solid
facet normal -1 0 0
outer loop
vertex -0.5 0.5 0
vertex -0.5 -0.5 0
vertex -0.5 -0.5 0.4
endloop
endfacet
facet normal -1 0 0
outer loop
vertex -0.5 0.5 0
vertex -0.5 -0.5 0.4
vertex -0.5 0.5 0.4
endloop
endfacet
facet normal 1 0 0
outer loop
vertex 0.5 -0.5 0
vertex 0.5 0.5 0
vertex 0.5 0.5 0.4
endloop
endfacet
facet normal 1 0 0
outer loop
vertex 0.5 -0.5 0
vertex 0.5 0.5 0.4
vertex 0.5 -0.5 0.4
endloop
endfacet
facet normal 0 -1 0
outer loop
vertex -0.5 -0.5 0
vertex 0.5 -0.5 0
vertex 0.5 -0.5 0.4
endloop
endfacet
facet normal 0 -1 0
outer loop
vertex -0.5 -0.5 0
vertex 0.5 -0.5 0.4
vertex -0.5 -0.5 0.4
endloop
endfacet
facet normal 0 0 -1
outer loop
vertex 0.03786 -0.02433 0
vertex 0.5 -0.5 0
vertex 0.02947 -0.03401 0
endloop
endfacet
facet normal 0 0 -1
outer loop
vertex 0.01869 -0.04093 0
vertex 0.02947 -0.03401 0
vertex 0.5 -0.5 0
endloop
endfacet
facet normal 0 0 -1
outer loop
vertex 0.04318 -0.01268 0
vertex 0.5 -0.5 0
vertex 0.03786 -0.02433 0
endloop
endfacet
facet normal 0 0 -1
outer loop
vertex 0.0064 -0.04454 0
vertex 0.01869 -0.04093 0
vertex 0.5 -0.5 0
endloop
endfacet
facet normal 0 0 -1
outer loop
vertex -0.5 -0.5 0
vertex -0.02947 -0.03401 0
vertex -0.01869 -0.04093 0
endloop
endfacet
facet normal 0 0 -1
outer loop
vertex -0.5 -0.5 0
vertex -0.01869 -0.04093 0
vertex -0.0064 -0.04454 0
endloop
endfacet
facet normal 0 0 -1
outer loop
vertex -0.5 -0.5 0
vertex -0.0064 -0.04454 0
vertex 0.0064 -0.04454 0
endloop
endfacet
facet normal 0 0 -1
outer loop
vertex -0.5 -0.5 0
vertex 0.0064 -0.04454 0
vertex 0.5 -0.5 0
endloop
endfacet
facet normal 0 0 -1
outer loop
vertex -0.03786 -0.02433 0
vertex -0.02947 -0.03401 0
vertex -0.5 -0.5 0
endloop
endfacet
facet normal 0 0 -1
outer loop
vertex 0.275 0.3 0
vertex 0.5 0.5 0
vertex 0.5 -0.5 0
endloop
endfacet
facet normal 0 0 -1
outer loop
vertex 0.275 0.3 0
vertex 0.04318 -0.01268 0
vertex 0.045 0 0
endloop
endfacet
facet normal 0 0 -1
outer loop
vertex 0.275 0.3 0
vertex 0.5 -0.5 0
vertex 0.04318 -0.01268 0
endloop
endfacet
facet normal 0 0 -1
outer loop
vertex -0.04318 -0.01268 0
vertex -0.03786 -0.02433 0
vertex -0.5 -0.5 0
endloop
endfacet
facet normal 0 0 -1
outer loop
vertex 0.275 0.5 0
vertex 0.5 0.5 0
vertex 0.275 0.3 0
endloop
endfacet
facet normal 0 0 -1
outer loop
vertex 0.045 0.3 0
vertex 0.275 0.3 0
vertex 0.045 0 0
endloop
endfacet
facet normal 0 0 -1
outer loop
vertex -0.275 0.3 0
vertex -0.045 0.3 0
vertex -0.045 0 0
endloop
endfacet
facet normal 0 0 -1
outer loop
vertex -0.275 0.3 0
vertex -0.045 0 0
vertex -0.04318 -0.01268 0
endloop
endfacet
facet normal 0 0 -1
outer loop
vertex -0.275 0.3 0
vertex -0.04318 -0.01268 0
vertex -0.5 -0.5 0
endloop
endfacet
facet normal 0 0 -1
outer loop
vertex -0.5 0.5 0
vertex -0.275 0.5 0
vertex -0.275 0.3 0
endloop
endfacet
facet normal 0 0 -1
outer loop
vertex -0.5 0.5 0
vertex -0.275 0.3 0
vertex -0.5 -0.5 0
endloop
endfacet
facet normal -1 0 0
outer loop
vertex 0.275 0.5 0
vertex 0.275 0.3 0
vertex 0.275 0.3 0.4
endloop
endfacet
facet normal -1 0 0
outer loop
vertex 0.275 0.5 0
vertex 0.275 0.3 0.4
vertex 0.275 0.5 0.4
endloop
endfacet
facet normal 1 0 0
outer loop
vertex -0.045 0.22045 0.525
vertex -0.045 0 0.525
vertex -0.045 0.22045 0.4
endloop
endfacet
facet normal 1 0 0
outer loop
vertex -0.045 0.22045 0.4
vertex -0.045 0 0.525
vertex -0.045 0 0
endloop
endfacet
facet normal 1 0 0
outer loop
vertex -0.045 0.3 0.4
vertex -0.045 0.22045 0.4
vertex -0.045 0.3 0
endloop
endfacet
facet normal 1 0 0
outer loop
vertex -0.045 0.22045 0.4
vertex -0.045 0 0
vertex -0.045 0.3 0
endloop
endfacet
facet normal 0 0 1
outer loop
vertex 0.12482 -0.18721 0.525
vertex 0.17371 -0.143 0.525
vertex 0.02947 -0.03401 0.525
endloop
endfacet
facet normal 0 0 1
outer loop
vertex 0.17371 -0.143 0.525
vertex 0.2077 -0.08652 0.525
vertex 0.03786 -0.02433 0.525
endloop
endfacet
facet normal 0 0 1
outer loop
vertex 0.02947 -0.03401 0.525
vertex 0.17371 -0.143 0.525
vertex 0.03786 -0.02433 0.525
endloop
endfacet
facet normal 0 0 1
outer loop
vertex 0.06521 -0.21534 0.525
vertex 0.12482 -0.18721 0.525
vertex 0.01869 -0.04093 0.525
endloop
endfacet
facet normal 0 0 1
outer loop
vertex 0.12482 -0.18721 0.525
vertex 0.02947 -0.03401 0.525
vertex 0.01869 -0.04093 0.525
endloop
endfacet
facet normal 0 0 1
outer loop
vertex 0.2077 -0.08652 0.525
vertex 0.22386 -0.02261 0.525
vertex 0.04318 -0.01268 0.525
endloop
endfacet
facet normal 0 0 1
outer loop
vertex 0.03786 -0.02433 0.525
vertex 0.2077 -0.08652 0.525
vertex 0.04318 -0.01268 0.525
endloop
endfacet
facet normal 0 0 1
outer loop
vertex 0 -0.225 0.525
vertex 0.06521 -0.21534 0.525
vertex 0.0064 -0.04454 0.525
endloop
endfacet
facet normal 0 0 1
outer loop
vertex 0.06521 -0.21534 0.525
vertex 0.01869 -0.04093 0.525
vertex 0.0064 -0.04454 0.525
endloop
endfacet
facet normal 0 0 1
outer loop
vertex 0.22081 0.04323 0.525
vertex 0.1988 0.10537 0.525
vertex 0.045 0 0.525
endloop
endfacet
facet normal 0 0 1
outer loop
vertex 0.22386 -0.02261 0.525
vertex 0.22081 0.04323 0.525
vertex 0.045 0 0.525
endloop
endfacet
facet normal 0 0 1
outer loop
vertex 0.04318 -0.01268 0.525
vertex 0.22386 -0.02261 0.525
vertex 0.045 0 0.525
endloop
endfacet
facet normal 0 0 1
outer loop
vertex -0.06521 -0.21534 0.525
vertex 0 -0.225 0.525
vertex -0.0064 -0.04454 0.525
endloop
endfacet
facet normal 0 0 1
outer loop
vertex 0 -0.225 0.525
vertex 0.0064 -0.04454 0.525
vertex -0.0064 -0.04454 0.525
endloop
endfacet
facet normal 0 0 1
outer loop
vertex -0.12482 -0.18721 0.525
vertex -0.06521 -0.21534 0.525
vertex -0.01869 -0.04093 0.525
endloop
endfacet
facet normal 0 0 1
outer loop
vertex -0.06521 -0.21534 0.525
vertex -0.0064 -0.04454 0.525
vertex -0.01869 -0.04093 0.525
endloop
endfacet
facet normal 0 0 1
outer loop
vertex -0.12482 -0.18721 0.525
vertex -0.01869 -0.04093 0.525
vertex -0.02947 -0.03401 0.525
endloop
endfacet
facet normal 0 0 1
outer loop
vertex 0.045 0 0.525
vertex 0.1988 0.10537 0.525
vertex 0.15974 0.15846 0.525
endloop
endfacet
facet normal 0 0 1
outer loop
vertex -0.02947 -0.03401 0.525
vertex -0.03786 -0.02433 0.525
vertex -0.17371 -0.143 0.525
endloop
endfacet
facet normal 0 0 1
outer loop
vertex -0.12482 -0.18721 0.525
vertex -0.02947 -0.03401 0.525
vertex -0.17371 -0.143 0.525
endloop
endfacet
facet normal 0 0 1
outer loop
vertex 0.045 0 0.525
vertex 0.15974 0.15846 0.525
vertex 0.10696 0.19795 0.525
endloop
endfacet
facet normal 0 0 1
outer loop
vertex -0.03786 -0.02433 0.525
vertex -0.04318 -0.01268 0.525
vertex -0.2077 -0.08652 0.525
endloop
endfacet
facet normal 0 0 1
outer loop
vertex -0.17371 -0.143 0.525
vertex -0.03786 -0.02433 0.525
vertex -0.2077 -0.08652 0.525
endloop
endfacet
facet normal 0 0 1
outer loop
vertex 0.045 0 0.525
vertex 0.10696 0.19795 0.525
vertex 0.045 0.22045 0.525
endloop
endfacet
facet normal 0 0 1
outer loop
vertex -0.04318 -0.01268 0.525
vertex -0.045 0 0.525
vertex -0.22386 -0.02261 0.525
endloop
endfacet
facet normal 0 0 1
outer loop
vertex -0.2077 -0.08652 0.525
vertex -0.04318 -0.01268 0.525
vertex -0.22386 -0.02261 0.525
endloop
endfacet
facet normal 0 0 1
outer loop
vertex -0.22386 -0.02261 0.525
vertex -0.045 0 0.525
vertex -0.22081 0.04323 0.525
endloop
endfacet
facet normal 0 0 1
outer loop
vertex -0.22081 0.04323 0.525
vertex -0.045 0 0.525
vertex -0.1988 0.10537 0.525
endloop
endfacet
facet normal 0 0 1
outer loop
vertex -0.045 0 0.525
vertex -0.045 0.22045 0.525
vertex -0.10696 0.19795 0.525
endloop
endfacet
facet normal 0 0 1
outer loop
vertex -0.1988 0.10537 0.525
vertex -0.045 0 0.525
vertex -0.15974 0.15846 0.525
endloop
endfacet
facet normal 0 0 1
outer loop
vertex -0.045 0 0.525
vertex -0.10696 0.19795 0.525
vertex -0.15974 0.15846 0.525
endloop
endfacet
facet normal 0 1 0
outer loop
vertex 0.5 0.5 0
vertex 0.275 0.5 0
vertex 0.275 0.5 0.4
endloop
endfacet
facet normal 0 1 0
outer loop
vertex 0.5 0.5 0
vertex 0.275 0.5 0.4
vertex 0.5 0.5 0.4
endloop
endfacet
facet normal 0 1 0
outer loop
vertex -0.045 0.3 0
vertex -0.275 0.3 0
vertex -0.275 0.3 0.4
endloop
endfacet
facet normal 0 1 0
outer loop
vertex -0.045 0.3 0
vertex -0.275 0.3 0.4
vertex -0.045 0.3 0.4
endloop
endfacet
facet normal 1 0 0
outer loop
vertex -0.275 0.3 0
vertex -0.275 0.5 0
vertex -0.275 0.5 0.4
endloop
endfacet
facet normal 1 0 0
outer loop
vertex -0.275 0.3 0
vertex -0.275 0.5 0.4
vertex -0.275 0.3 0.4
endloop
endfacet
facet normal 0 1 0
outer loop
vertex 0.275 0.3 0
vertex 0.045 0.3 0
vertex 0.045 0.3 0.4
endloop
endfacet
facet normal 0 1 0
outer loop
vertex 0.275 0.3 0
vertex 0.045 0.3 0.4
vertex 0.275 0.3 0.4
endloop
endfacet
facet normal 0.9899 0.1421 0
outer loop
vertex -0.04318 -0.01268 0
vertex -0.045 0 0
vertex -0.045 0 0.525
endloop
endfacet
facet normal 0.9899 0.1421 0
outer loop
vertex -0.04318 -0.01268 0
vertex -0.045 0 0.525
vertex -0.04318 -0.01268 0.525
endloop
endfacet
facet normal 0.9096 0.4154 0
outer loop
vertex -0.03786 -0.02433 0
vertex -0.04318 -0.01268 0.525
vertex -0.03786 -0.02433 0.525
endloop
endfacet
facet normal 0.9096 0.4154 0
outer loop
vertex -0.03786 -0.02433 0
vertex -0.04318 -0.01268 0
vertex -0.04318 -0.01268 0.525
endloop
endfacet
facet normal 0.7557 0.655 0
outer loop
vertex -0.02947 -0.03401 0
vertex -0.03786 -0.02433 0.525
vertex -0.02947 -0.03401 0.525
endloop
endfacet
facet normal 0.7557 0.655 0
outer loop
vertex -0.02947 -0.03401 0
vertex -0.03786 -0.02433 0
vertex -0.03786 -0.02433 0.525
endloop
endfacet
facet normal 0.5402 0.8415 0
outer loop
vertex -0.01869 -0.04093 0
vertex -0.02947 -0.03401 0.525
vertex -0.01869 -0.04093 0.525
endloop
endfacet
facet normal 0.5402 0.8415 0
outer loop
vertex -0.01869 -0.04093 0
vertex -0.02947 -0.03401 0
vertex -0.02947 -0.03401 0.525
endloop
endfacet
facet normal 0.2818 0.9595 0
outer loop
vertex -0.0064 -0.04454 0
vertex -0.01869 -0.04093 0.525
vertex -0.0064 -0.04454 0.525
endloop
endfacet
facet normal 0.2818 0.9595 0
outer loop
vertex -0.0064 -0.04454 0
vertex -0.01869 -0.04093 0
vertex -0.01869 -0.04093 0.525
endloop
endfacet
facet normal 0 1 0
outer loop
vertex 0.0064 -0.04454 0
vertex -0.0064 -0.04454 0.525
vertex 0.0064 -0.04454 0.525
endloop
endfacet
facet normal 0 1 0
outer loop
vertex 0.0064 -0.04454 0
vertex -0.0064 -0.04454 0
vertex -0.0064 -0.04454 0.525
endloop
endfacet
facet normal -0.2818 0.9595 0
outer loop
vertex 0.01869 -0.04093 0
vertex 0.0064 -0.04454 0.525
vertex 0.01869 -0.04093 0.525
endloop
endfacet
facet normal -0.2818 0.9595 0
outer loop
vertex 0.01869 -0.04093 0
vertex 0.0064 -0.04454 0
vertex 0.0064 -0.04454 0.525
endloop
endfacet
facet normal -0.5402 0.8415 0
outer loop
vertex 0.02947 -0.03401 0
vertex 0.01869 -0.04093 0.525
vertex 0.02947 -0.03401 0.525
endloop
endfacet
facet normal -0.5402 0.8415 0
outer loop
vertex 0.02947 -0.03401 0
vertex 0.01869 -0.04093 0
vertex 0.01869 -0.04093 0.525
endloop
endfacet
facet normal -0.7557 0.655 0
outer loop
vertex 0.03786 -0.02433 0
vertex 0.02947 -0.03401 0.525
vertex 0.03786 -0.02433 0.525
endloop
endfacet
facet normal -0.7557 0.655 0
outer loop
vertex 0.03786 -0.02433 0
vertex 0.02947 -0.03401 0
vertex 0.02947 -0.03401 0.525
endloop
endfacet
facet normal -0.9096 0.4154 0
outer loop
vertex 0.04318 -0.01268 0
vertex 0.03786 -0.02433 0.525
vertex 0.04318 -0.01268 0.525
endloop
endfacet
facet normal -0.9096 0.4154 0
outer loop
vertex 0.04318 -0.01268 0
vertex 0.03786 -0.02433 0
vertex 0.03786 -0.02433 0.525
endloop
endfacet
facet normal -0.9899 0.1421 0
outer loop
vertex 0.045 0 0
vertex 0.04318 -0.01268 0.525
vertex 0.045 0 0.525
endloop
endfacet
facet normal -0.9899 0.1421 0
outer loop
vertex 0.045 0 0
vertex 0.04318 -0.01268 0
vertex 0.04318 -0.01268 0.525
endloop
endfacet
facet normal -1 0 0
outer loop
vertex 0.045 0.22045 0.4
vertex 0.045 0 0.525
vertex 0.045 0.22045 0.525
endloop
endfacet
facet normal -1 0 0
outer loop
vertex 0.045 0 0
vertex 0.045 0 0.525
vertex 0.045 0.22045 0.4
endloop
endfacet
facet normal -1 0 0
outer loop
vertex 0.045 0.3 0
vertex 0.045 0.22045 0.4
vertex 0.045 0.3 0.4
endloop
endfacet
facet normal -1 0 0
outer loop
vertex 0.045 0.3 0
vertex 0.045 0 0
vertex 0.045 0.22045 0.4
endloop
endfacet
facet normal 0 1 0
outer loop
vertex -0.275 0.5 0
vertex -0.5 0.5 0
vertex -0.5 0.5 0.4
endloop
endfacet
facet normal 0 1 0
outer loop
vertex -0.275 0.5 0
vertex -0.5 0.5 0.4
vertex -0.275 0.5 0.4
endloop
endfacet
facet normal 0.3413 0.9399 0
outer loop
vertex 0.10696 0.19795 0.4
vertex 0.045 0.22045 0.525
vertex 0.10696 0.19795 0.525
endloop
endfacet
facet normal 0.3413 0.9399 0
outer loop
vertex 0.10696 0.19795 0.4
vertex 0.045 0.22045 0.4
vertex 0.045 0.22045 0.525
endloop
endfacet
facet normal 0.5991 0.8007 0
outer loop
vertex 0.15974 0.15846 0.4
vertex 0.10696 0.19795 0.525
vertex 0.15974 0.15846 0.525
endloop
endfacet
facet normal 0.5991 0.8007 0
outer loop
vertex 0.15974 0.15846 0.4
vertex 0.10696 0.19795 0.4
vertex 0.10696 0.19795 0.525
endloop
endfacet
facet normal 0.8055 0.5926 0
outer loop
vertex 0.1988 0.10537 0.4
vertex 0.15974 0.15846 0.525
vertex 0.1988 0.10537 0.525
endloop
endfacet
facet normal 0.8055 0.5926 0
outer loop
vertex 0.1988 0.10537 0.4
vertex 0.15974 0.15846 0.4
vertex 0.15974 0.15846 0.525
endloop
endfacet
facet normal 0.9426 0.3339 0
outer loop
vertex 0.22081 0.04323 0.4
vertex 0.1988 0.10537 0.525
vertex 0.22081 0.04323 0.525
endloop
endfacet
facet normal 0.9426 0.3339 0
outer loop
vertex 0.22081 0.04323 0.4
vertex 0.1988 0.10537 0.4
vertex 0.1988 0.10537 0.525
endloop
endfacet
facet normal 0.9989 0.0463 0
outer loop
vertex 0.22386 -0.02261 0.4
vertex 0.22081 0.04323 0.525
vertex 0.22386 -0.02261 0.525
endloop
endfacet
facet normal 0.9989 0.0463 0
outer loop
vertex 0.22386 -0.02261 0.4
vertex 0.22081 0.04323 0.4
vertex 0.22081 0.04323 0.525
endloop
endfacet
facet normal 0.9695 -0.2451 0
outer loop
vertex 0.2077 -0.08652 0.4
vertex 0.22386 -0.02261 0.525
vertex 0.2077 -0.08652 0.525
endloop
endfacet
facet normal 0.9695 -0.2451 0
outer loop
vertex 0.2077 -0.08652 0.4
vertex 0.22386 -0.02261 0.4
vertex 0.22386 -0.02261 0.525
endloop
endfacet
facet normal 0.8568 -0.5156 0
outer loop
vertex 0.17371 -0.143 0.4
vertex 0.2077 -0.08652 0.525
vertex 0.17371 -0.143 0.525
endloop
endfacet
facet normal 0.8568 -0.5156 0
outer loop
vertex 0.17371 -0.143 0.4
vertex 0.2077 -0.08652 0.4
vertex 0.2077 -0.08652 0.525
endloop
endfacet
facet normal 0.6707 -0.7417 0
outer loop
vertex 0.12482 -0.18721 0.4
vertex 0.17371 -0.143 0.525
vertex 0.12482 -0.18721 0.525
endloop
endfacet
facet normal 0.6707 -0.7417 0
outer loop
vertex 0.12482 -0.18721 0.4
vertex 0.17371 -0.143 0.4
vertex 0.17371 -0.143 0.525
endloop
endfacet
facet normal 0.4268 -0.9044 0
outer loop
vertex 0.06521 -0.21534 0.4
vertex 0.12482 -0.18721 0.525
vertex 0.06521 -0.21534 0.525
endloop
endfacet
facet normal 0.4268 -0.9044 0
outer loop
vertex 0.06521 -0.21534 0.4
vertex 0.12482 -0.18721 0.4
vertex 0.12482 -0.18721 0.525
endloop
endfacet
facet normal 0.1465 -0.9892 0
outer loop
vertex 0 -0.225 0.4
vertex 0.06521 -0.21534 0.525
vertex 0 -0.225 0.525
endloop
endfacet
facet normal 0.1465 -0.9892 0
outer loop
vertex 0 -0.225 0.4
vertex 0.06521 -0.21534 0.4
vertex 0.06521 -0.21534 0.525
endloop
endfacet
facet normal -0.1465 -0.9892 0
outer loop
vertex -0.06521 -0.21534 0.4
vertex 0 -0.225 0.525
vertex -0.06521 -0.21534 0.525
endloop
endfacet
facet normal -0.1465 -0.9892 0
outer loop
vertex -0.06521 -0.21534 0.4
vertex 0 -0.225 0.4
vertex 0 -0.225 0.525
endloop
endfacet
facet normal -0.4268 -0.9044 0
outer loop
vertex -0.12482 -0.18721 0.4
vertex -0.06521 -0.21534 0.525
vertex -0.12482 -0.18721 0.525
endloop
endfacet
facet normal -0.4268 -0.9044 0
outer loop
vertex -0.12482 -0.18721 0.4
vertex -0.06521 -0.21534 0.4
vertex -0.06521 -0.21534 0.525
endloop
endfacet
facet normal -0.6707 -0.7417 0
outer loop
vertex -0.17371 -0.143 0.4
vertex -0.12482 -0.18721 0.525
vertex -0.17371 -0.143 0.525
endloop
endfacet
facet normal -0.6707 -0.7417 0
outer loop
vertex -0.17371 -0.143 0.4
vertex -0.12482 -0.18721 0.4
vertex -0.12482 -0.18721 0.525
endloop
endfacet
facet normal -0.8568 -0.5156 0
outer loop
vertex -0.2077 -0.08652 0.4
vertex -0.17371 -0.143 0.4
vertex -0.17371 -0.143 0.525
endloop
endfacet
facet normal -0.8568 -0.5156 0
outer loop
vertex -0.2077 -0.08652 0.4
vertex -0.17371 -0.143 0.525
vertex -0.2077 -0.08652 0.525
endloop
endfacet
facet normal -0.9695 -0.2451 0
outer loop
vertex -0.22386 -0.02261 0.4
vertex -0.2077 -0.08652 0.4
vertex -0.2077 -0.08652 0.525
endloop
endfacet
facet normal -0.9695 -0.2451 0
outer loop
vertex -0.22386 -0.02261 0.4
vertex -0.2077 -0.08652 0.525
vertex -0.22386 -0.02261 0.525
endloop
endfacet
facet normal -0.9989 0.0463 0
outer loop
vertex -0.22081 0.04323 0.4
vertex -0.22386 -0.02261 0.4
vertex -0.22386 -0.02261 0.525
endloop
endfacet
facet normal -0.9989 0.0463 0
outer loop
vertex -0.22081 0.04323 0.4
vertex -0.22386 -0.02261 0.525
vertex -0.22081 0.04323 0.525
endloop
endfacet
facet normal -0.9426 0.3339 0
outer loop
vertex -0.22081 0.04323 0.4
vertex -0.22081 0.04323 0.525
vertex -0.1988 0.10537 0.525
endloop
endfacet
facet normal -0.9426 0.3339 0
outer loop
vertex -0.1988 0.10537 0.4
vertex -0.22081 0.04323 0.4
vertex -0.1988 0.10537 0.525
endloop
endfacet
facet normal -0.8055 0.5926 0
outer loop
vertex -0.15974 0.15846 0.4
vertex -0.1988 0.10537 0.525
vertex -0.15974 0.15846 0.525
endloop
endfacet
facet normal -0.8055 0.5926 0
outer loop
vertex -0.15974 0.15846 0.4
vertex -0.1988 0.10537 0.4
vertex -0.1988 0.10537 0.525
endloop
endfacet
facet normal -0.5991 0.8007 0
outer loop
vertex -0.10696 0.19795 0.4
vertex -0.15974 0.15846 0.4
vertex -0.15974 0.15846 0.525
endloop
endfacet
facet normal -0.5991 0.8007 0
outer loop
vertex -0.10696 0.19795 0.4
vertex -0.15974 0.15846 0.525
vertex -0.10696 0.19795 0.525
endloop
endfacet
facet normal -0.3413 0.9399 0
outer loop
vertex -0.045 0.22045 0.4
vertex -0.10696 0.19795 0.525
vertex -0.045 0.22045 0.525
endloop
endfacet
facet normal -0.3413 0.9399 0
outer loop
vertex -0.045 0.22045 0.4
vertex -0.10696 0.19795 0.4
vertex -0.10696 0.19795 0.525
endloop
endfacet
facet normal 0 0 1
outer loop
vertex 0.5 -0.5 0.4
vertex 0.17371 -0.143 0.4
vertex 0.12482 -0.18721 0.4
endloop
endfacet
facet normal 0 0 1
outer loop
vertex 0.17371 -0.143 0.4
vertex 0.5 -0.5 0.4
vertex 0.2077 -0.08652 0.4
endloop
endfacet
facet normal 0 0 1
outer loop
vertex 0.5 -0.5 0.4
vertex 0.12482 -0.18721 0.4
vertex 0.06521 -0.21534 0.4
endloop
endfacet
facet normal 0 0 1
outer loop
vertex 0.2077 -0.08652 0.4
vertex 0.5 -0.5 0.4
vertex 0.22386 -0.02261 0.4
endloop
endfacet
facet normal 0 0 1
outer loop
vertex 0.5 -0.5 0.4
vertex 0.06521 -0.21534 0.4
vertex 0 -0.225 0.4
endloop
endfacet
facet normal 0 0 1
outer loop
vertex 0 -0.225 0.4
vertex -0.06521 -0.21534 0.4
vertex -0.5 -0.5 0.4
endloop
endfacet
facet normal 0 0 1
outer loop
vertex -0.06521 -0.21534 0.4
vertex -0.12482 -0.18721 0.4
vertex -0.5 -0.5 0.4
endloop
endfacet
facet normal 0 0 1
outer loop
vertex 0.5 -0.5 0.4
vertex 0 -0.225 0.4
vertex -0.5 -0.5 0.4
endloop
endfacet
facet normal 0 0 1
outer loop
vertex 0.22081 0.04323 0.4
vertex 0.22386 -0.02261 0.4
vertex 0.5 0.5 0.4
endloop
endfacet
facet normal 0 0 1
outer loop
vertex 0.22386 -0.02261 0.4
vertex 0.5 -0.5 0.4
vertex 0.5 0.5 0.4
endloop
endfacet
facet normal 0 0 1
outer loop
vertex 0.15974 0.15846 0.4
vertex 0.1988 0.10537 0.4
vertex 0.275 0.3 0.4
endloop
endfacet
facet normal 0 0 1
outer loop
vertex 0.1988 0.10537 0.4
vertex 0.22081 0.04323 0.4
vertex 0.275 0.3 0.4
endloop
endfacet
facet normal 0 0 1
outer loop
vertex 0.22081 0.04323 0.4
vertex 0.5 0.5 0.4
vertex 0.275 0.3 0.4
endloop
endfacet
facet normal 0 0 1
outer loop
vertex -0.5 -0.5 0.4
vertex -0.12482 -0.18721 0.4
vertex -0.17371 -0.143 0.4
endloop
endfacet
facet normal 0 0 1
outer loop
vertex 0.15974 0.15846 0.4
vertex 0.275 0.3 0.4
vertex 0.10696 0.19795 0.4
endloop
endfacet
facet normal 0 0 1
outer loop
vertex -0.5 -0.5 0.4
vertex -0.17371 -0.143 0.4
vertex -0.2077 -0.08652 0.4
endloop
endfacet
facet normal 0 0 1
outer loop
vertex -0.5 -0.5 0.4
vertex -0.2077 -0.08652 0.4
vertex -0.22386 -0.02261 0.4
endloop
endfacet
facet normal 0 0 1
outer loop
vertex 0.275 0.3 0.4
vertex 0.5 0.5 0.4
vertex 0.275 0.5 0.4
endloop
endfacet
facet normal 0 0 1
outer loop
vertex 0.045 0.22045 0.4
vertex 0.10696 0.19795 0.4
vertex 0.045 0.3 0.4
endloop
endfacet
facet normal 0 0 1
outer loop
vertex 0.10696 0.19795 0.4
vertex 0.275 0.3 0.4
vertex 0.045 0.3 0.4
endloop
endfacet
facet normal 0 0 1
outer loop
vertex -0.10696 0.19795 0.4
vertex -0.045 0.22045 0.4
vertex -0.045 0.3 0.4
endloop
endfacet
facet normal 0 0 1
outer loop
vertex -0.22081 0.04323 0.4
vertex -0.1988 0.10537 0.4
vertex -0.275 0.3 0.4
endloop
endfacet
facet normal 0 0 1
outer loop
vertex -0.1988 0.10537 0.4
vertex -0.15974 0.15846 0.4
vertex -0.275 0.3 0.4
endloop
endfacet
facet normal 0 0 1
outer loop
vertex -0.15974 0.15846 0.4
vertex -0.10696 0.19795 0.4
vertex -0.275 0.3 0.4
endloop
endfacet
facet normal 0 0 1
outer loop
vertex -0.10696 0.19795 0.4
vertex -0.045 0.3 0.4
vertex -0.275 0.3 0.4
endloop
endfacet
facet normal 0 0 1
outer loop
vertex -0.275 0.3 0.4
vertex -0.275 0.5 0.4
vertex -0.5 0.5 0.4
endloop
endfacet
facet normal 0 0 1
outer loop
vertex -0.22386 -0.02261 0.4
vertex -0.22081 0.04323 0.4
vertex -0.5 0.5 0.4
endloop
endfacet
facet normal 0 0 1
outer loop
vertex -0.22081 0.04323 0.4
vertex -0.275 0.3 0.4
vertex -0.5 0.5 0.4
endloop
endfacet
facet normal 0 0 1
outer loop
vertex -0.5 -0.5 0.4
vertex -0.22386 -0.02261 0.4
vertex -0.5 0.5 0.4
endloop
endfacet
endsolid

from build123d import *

# Parameters (mm, degrees)
BOSS_EXTRUDE1_DEPTH = 0.4
SKETCH2_R           = 0.225
BOSS_EXTRUDE2_DEPTH = 0.525
SKETCH3_R           = 0.045
CUT_EXTRUDE1_DEPTH  = 1.880695748
SKETCH5_W           = 0.09
SKETCH5_H           = 0.5
CUT_EXTRUDE2_DEPTH  = 1.880695748


with BuildPart() as part:
    # Sketch1 → Boss-Extrude1 (new body)
    with BuildSketch(Plane.XY):
        Polygon((0.275, 0.5), (0.5, 0.5), (0.5, -0.5), (-0.5, -0.5), (-0.5, 0.5), (-0.275, 0.5), (-0.275, 0.3), (0.275, 0.3), align=None)
    extrude(amount=BOSS_EXTRUDE1_DEPTH)

    # Sketch2 → Boss-Extrude2 (add)
    with BuildSketch(Plane(origin=(0, 0, 0), x_dir=(-1, 0, 0), z_dir=(0, 0, -1))):
        Circle(SKETCH2_R)
    extrude(amount=-BOSS_EXTRUDE2_DEPTH)

    # Sketch3 → Cut-Extrude1 (cut, through all)
    with BuildSketch(Plane.XY):
        Circle(SKETCH3_R)
    extrude(amount=CUT_EXTRUDE1_DEPTH, mode=Mode.SUBTRACT)

    # Sketch5 → Cut-Extrude2 (cut, through all)
    with BuildSketch(Plane(origin=(0, 0, 0), x_dir=(-1, 0, 0), z_dir=(0, 0, -1))):
        with Locations((0, 0.25)):
            Rectangle(SKETCH5_W, SKETCH5_H)
    extrude(amount=-CUT_EXTRUDE2_DEPTH, mode=Mode.SUBTRACT)


solid = part.part
